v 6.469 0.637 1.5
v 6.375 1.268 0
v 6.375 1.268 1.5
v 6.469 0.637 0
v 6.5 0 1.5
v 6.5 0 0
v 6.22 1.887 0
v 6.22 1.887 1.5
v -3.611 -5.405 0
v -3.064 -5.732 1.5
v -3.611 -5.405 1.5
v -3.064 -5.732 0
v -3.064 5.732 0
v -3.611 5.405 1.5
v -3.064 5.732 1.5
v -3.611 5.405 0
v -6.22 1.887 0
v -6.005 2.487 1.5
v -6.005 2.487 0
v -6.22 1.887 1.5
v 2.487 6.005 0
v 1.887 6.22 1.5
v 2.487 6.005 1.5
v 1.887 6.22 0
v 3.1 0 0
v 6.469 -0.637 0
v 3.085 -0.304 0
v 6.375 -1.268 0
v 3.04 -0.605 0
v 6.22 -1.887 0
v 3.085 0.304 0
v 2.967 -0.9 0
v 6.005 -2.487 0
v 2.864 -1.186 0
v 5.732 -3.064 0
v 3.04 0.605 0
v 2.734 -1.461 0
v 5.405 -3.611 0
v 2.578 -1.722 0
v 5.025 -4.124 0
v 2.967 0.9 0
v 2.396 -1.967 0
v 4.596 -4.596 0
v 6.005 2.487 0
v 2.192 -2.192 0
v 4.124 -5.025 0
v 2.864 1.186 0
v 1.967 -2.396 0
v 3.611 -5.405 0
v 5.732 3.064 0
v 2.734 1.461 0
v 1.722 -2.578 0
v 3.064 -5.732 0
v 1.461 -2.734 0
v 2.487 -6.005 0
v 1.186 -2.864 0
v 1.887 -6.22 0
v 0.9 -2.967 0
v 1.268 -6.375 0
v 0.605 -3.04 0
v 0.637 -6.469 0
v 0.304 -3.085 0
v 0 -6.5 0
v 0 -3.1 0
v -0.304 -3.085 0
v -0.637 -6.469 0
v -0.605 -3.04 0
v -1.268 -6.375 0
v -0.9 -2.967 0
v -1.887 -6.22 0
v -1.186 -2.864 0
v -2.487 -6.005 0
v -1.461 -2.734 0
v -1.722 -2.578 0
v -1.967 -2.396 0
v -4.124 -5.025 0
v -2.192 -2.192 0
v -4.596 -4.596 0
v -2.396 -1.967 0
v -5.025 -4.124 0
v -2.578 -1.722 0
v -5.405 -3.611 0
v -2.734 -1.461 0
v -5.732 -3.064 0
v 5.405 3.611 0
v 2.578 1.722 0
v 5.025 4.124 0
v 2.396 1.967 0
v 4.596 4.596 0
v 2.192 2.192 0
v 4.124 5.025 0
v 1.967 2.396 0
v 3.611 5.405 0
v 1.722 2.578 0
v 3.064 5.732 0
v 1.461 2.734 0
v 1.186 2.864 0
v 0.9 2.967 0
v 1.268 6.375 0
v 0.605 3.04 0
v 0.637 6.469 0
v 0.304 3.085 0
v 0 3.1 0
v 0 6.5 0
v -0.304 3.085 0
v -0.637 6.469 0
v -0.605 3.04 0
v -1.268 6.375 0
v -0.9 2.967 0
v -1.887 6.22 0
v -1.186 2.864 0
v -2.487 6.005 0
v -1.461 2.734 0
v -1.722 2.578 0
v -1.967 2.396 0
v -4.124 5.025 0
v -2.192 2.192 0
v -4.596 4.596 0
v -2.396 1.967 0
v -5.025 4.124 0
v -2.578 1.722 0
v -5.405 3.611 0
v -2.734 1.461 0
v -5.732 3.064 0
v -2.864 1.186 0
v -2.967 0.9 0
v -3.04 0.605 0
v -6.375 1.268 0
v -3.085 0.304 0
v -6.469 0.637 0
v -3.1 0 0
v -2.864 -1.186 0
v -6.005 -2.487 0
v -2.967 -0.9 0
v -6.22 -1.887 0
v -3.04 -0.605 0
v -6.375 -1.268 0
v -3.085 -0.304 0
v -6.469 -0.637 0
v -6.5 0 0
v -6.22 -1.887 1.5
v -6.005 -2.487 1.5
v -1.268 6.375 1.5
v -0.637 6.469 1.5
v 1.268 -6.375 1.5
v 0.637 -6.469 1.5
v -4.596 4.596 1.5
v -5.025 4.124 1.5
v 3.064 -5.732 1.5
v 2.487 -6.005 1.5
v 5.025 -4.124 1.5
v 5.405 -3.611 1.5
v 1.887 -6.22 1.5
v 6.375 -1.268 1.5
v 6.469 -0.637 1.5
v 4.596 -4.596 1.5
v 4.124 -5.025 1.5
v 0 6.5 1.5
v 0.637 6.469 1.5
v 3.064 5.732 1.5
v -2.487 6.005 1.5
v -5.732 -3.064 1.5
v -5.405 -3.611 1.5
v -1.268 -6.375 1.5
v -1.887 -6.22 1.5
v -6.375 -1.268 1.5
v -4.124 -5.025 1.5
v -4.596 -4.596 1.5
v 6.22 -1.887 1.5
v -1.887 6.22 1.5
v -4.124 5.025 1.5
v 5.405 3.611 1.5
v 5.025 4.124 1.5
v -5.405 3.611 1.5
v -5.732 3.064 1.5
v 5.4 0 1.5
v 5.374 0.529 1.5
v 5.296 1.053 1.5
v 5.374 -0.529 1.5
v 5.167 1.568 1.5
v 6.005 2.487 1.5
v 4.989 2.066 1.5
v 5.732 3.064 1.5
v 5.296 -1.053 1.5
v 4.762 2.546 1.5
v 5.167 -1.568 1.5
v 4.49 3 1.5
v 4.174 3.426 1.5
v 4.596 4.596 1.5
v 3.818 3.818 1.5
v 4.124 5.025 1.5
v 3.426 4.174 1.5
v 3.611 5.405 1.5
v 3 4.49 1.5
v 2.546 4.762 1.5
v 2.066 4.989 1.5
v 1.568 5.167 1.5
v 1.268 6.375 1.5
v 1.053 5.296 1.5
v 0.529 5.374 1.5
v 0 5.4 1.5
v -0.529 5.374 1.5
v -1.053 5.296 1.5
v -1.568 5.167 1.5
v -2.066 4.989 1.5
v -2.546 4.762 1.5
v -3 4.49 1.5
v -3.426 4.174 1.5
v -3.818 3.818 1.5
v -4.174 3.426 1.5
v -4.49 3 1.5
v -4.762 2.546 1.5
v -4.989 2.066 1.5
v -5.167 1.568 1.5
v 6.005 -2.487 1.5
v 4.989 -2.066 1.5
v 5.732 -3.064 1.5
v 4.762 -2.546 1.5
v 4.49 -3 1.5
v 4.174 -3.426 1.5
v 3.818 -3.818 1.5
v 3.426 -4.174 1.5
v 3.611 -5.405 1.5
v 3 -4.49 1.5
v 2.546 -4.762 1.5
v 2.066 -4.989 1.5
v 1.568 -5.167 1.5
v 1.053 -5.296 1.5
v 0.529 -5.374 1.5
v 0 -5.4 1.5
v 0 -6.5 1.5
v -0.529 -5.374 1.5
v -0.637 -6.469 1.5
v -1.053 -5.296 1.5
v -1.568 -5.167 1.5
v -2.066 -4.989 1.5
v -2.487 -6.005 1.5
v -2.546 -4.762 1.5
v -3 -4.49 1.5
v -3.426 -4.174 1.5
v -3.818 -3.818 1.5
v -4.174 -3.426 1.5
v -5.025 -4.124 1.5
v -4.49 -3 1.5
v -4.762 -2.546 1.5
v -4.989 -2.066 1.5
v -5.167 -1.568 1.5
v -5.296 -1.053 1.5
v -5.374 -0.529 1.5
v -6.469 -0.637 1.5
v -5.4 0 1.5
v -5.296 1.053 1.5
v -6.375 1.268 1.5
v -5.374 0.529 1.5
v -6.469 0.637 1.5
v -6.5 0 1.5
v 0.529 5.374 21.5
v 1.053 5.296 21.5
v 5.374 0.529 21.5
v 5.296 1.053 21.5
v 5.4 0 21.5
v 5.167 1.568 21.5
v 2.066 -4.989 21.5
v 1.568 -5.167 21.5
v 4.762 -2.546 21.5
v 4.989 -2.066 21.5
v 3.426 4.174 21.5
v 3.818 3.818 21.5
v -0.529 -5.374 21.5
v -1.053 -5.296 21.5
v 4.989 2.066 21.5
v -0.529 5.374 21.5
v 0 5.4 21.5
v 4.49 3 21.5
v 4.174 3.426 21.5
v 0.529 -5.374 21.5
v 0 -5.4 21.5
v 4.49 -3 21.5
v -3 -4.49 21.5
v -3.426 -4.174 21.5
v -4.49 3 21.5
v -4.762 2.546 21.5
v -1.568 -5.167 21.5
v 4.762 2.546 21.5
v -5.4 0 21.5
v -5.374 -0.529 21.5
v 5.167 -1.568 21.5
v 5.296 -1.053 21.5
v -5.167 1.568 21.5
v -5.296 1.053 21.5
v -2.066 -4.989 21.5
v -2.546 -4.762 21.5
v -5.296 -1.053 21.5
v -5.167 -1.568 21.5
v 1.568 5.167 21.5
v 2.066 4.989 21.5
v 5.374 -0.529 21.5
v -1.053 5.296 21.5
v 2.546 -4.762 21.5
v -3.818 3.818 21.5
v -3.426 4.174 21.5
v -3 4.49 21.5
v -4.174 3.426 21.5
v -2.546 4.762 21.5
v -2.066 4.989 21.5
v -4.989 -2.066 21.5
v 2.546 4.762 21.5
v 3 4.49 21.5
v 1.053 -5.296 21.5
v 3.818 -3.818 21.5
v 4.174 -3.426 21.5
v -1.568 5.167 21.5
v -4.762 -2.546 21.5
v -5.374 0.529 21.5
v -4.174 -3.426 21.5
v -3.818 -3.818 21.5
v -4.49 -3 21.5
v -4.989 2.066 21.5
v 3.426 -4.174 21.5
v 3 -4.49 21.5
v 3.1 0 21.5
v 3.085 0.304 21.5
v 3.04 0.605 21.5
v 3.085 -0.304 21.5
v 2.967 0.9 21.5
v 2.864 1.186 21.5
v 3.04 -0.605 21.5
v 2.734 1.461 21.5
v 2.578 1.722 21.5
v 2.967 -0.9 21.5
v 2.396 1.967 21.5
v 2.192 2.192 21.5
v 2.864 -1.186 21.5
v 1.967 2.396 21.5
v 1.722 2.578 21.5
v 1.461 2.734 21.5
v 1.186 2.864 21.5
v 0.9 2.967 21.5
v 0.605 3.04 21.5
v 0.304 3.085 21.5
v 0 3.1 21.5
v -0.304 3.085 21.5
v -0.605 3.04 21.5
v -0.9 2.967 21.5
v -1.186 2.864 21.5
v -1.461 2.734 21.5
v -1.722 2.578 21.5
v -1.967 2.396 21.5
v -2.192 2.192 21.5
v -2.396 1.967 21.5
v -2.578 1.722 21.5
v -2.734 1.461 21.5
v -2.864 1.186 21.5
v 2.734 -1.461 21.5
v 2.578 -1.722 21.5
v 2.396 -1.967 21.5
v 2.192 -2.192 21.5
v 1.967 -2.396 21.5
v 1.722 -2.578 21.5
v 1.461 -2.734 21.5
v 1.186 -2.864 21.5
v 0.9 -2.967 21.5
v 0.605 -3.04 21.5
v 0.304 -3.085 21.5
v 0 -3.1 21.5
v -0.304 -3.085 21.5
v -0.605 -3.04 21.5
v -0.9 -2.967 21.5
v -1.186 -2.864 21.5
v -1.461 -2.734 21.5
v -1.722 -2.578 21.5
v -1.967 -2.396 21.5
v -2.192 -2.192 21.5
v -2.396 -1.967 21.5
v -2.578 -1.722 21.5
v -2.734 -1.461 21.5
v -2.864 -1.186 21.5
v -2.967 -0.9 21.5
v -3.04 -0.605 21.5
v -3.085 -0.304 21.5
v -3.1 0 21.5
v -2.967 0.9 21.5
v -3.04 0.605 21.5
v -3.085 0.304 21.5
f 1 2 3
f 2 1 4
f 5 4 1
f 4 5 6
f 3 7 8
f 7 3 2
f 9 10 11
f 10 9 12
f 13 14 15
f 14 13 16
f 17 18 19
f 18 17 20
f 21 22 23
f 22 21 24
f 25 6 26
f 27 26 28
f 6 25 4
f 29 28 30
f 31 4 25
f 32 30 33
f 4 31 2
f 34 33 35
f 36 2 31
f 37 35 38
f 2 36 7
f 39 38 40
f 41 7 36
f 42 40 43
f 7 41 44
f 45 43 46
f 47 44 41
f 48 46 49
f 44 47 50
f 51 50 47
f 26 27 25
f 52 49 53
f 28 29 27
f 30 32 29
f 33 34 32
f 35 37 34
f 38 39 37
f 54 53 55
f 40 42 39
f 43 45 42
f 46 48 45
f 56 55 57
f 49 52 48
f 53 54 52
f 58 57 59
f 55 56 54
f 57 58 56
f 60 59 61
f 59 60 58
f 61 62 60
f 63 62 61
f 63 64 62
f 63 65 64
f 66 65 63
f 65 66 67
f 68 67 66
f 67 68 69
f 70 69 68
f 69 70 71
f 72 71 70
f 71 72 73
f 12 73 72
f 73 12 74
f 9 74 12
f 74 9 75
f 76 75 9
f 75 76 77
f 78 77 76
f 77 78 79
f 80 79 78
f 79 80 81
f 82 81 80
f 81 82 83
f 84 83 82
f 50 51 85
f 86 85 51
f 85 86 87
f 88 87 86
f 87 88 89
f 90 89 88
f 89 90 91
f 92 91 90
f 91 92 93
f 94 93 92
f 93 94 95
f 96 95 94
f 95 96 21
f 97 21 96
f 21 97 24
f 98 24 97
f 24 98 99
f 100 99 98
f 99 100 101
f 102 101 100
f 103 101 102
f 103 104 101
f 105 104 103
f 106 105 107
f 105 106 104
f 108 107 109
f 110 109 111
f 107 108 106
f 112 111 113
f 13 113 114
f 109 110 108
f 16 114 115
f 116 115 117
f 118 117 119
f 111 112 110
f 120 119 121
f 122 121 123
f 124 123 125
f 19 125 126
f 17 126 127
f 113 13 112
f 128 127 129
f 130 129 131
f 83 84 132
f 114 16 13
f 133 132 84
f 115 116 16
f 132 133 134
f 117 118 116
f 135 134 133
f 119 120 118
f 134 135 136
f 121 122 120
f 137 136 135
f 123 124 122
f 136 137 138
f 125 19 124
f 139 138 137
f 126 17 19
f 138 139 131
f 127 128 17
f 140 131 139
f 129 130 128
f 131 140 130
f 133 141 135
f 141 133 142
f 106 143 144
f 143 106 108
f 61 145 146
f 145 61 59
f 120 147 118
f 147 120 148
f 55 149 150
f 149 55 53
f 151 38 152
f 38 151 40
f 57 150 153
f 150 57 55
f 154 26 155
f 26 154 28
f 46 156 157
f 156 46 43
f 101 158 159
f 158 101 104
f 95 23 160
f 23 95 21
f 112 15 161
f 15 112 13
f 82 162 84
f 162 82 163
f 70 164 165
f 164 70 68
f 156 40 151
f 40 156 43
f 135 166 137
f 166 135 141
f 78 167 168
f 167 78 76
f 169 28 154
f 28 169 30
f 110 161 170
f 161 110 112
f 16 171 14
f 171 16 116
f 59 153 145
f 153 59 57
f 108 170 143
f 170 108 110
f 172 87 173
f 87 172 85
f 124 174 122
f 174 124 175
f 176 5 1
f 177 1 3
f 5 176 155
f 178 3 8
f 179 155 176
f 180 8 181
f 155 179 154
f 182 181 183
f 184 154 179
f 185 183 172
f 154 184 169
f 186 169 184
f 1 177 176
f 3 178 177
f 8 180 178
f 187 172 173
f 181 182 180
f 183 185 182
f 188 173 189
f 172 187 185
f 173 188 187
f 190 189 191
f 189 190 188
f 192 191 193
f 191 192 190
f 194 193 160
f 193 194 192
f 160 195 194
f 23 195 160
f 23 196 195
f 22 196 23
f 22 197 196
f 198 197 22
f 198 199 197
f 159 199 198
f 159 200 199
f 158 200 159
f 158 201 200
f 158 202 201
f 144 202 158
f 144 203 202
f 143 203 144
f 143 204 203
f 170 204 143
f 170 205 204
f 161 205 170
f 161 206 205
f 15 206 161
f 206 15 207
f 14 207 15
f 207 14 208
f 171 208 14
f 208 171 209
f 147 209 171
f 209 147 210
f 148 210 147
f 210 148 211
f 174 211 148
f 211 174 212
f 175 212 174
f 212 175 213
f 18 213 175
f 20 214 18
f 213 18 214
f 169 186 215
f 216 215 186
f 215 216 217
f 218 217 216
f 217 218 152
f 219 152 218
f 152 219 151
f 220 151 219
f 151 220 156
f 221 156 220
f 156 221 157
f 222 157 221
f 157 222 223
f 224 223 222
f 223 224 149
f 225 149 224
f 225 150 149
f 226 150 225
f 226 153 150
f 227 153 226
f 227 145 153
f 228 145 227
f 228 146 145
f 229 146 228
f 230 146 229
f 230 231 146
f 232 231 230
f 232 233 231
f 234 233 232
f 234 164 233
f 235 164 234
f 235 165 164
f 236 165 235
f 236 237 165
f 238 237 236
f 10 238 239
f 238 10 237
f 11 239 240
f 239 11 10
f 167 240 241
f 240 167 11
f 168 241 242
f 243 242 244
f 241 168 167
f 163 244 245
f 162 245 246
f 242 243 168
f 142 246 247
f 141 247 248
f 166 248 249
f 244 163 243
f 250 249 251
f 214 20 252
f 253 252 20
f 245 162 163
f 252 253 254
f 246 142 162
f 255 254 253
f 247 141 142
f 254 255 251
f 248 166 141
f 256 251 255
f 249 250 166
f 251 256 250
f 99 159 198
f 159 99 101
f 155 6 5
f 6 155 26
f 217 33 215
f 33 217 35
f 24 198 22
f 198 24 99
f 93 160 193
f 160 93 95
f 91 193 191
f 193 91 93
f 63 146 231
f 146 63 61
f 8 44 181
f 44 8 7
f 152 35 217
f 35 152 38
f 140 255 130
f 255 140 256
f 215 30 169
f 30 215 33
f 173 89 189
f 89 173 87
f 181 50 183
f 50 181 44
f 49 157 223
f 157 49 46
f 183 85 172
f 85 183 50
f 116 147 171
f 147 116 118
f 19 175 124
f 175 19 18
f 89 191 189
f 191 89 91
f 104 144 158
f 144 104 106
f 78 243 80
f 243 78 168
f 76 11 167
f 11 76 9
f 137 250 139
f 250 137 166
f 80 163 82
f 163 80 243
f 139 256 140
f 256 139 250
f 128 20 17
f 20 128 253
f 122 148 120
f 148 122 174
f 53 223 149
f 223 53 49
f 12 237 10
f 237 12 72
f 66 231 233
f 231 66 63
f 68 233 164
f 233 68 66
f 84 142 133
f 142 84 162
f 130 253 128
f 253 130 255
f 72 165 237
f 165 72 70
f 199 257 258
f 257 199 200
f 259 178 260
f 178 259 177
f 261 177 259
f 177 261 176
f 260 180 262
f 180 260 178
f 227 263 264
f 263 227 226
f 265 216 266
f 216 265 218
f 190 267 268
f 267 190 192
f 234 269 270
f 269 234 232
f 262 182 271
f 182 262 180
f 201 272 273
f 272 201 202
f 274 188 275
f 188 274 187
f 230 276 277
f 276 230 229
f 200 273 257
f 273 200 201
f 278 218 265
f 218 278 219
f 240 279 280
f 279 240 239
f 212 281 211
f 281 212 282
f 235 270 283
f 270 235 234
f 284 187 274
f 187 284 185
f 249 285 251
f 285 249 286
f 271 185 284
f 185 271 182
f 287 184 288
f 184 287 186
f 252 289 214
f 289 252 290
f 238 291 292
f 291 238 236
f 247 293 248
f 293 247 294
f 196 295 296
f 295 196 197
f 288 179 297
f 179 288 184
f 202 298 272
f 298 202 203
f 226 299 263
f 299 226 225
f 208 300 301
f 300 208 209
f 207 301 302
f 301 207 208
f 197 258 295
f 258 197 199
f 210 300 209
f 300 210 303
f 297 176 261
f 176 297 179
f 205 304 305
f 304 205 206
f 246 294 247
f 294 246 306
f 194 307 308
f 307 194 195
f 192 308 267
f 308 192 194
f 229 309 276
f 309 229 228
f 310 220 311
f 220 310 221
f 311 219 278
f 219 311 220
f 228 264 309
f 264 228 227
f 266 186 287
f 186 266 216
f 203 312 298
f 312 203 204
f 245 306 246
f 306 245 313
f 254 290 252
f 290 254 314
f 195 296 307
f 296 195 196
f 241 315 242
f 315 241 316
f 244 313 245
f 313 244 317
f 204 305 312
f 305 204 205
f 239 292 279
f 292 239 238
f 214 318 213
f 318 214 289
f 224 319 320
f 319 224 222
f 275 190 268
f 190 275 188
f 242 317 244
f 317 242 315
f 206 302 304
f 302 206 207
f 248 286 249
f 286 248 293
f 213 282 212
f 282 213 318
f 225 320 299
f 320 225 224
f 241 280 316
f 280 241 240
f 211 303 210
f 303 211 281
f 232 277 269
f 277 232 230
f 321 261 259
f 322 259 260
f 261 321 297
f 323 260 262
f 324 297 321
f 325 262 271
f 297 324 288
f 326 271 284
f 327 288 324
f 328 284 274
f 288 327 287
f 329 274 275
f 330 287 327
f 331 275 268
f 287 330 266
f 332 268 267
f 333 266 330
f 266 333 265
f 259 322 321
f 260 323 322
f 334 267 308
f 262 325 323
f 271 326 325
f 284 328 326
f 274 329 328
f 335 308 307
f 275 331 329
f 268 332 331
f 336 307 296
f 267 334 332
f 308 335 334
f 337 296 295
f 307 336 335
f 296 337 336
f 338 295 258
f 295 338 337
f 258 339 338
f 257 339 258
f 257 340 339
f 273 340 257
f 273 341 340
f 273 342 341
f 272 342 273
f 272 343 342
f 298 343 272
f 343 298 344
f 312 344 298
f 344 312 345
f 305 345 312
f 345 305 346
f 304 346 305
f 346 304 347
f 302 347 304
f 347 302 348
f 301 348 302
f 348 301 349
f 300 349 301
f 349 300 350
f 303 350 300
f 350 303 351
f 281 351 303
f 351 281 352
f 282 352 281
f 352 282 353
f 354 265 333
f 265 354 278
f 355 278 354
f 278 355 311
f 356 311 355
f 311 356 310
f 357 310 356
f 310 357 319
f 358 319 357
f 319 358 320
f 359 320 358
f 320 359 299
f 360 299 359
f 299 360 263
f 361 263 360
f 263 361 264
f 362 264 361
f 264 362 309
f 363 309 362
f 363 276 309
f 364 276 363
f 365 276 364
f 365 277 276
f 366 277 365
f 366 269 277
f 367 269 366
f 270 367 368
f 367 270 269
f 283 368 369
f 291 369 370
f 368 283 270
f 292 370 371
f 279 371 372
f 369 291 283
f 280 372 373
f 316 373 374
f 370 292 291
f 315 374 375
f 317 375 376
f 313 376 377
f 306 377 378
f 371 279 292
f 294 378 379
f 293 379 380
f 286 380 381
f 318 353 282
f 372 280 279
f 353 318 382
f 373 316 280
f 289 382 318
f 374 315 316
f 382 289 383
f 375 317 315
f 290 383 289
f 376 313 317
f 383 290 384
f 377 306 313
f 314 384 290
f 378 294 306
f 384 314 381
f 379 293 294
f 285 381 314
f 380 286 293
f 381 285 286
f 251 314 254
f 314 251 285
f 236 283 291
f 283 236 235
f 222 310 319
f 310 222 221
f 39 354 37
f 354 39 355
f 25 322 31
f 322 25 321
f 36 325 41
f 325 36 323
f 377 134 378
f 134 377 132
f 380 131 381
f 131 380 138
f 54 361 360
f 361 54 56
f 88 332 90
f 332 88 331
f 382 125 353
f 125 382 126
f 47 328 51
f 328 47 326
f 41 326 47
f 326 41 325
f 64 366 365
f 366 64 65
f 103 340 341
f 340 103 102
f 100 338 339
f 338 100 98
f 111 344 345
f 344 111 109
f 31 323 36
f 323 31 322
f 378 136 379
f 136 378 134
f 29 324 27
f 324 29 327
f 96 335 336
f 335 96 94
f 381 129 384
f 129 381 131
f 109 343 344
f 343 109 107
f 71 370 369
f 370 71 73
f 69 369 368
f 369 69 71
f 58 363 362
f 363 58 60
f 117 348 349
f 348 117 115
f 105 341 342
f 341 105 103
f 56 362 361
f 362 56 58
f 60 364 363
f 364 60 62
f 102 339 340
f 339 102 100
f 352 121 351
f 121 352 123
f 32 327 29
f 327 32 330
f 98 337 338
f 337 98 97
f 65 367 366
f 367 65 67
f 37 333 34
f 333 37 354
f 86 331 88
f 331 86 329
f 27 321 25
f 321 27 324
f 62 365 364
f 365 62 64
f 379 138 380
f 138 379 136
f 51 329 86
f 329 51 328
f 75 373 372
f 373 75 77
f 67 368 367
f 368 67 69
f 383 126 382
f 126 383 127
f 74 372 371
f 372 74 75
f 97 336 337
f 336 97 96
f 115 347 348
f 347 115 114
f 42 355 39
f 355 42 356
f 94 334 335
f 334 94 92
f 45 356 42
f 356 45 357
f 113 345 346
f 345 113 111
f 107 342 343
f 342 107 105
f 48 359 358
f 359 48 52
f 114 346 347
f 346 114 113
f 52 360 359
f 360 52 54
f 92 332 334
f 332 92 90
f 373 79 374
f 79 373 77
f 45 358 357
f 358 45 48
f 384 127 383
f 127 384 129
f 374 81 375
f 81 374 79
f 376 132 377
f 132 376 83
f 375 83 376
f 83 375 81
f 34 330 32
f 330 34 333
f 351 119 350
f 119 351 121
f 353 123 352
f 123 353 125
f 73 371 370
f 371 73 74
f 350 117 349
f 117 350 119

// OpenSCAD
// Adapter sleeve: 0.2 mL PCR tube in a 1.5 mL rack hole
// Print orientation: collar on bed (z = 0), sleeve body rises to z = 21.5

$fn = 64;

// --- Dimensions (mm) ---
collar_d      = 13;    // collar outer diameter
collar_h      = 1.5;   // collar thickness
sleeve_od     = 10.8;  // sleeve body outer diameter
sleeve_h      = 20;    // sleeve body height (z = 1.5 to 21.5)
bore_d        = 6.2;   // straight through-bore diameter
eps           = 0.5;   // cutter overshoot past faces

total_h = collar_h + sleeve_h; // 21.5 mm overall height

difference() {
    union() {
        // Collar
        cylinder(d = collar_d, h = collar_h);
        // Sleeve body (slightly overlapping the collar for a clean union)
        translate([0, 0, collar_h - 0.01])
            cylinder(d = sleeve_od, h = sleeve_h + 0.01);
    }
    // Full-height bore, open at both ends
    translate([0, 0, -eps])
        cylinder(d = bore_d, h = total_h + 2 * eps);
}
